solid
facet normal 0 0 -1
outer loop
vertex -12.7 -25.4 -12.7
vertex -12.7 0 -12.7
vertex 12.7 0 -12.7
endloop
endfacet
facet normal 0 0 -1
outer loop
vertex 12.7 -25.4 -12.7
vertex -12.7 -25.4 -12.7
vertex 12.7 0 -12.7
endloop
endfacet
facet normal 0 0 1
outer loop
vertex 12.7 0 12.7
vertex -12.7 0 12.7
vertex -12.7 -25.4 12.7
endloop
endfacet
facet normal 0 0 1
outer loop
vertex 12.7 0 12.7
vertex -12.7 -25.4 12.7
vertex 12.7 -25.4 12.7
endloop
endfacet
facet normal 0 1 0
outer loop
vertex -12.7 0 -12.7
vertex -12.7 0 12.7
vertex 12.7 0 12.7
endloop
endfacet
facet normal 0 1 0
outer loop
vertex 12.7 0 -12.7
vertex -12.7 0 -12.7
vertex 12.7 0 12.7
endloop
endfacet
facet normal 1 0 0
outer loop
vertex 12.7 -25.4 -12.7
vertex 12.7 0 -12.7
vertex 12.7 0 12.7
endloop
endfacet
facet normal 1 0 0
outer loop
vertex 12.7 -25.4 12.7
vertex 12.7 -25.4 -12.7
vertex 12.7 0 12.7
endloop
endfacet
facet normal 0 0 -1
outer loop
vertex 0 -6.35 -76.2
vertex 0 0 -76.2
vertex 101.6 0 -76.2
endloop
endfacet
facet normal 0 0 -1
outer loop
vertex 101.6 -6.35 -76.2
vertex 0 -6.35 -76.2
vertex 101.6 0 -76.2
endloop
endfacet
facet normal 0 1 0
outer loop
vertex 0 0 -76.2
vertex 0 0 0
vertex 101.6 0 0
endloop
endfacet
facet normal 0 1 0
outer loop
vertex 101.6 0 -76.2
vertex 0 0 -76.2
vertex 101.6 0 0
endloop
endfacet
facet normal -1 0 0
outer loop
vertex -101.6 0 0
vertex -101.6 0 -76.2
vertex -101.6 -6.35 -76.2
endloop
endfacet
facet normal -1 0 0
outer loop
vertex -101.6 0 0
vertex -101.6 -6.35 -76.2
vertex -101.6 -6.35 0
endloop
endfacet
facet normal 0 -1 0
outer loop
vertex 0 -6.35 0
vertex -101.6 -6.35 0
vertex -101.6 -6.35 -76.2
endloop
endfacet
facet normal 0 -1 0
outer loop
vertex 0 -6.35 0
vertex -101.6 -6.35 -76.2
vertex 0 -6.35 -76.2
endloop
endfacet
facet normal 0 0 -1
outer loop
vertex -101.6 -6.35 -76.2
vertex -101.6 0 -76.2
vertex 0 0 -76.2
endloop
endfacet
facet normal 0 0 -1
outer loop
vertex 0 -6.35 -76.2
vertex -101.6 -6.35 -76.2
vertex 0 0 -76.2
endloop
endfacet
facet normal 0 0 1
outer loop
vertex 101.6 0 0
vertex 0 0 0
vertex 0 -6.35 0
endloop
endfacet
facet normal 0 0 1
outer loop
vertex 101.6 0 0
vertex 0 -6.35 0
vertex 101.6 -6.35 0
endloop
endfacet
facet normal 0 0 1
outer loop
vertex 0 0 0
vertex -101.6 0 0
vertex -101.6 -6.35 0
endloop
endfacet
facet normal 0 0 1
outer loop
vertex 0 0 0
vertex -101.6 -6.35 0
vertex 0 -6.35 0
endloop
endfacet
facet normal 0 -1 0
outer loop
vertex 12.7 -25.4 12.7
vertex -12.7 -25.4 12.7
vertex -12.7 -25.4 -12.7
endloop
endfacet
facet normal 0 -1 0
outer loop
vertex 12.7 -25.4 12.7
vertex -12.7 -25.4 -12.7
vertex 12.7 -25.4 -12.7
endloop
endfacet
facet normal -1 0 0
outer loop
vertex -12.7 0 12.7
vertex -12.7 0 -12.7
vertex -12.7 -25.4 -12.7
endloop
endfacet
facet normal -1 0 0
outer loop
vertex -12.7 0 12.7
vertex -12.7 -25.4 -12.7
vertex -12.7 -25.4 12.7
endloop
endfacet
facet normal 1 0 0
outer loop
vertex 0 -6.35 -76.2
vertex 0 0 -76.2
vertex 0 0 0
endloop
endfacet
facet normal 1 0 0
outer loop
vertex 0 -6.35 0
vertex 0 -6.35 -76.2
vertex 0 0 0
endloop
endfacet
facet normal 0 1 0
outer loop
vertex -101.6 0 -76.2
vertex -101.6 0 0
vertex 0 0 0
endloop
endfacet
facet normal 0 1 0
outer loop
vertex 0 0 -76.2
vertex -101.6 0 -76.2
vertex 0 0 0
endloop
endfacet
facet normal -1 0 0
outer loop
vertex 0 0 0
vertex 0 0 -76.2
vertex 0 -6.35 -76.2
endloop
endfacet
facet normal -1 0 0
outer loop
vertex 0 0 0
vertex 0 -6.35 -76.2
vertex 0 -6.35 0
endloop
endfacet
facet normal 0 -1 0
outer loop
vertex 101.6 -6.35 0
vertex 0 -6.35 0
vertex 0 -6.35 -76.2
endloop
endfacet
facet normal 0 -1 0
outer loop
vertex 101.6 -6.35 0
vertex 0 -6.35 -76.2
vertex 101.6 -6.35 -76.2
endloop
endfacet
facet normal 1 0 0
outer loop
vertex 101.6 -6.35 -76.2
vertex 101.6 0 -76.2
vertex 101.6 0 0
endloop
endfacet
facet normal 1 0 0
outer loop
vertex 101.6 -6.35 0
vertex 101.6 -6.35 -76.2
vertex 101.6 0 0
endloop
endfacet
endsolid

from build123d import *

# Parameters (mm, degrees)
F2_W     = 101.6
F2_H     = 76.2
F3_DEPTH = 6.35
F1_W     = 101.6
F1_H     = 76.2
F0_W     = 25.4
F0_H     = 25.4
F4_DEPTH = 25.4


with BuildPart() as f3:
    # F2 (on Front) → F3 (new body)
    with BuildSketch(Plane.XZ):
        with Locations((-50.8, -38.1)):
            Rectangle(F2_W, F2_H)
    extrude(amount=F3_DEPTH)


with BuildPart() as f3b:
    # F1 (on Front) → F3, piece 2 (new body)
    with BuildSketch(Plane.XZ):
        with Locations((50.8, -38.1)):
            Rectangle(F1_W, F1_H)
    extrude(amount=F3_DEPTH)


with BuildPart() as f4:
    # F0 (on Front) → F4 (new body)
    with BuildSketch(Plane.XZ):
        Rectangle(F0_W, F0_H)
    extrude(amount=F4_DEPTH)


solid = Compound([f3.part, f3b.part, f4.part])
